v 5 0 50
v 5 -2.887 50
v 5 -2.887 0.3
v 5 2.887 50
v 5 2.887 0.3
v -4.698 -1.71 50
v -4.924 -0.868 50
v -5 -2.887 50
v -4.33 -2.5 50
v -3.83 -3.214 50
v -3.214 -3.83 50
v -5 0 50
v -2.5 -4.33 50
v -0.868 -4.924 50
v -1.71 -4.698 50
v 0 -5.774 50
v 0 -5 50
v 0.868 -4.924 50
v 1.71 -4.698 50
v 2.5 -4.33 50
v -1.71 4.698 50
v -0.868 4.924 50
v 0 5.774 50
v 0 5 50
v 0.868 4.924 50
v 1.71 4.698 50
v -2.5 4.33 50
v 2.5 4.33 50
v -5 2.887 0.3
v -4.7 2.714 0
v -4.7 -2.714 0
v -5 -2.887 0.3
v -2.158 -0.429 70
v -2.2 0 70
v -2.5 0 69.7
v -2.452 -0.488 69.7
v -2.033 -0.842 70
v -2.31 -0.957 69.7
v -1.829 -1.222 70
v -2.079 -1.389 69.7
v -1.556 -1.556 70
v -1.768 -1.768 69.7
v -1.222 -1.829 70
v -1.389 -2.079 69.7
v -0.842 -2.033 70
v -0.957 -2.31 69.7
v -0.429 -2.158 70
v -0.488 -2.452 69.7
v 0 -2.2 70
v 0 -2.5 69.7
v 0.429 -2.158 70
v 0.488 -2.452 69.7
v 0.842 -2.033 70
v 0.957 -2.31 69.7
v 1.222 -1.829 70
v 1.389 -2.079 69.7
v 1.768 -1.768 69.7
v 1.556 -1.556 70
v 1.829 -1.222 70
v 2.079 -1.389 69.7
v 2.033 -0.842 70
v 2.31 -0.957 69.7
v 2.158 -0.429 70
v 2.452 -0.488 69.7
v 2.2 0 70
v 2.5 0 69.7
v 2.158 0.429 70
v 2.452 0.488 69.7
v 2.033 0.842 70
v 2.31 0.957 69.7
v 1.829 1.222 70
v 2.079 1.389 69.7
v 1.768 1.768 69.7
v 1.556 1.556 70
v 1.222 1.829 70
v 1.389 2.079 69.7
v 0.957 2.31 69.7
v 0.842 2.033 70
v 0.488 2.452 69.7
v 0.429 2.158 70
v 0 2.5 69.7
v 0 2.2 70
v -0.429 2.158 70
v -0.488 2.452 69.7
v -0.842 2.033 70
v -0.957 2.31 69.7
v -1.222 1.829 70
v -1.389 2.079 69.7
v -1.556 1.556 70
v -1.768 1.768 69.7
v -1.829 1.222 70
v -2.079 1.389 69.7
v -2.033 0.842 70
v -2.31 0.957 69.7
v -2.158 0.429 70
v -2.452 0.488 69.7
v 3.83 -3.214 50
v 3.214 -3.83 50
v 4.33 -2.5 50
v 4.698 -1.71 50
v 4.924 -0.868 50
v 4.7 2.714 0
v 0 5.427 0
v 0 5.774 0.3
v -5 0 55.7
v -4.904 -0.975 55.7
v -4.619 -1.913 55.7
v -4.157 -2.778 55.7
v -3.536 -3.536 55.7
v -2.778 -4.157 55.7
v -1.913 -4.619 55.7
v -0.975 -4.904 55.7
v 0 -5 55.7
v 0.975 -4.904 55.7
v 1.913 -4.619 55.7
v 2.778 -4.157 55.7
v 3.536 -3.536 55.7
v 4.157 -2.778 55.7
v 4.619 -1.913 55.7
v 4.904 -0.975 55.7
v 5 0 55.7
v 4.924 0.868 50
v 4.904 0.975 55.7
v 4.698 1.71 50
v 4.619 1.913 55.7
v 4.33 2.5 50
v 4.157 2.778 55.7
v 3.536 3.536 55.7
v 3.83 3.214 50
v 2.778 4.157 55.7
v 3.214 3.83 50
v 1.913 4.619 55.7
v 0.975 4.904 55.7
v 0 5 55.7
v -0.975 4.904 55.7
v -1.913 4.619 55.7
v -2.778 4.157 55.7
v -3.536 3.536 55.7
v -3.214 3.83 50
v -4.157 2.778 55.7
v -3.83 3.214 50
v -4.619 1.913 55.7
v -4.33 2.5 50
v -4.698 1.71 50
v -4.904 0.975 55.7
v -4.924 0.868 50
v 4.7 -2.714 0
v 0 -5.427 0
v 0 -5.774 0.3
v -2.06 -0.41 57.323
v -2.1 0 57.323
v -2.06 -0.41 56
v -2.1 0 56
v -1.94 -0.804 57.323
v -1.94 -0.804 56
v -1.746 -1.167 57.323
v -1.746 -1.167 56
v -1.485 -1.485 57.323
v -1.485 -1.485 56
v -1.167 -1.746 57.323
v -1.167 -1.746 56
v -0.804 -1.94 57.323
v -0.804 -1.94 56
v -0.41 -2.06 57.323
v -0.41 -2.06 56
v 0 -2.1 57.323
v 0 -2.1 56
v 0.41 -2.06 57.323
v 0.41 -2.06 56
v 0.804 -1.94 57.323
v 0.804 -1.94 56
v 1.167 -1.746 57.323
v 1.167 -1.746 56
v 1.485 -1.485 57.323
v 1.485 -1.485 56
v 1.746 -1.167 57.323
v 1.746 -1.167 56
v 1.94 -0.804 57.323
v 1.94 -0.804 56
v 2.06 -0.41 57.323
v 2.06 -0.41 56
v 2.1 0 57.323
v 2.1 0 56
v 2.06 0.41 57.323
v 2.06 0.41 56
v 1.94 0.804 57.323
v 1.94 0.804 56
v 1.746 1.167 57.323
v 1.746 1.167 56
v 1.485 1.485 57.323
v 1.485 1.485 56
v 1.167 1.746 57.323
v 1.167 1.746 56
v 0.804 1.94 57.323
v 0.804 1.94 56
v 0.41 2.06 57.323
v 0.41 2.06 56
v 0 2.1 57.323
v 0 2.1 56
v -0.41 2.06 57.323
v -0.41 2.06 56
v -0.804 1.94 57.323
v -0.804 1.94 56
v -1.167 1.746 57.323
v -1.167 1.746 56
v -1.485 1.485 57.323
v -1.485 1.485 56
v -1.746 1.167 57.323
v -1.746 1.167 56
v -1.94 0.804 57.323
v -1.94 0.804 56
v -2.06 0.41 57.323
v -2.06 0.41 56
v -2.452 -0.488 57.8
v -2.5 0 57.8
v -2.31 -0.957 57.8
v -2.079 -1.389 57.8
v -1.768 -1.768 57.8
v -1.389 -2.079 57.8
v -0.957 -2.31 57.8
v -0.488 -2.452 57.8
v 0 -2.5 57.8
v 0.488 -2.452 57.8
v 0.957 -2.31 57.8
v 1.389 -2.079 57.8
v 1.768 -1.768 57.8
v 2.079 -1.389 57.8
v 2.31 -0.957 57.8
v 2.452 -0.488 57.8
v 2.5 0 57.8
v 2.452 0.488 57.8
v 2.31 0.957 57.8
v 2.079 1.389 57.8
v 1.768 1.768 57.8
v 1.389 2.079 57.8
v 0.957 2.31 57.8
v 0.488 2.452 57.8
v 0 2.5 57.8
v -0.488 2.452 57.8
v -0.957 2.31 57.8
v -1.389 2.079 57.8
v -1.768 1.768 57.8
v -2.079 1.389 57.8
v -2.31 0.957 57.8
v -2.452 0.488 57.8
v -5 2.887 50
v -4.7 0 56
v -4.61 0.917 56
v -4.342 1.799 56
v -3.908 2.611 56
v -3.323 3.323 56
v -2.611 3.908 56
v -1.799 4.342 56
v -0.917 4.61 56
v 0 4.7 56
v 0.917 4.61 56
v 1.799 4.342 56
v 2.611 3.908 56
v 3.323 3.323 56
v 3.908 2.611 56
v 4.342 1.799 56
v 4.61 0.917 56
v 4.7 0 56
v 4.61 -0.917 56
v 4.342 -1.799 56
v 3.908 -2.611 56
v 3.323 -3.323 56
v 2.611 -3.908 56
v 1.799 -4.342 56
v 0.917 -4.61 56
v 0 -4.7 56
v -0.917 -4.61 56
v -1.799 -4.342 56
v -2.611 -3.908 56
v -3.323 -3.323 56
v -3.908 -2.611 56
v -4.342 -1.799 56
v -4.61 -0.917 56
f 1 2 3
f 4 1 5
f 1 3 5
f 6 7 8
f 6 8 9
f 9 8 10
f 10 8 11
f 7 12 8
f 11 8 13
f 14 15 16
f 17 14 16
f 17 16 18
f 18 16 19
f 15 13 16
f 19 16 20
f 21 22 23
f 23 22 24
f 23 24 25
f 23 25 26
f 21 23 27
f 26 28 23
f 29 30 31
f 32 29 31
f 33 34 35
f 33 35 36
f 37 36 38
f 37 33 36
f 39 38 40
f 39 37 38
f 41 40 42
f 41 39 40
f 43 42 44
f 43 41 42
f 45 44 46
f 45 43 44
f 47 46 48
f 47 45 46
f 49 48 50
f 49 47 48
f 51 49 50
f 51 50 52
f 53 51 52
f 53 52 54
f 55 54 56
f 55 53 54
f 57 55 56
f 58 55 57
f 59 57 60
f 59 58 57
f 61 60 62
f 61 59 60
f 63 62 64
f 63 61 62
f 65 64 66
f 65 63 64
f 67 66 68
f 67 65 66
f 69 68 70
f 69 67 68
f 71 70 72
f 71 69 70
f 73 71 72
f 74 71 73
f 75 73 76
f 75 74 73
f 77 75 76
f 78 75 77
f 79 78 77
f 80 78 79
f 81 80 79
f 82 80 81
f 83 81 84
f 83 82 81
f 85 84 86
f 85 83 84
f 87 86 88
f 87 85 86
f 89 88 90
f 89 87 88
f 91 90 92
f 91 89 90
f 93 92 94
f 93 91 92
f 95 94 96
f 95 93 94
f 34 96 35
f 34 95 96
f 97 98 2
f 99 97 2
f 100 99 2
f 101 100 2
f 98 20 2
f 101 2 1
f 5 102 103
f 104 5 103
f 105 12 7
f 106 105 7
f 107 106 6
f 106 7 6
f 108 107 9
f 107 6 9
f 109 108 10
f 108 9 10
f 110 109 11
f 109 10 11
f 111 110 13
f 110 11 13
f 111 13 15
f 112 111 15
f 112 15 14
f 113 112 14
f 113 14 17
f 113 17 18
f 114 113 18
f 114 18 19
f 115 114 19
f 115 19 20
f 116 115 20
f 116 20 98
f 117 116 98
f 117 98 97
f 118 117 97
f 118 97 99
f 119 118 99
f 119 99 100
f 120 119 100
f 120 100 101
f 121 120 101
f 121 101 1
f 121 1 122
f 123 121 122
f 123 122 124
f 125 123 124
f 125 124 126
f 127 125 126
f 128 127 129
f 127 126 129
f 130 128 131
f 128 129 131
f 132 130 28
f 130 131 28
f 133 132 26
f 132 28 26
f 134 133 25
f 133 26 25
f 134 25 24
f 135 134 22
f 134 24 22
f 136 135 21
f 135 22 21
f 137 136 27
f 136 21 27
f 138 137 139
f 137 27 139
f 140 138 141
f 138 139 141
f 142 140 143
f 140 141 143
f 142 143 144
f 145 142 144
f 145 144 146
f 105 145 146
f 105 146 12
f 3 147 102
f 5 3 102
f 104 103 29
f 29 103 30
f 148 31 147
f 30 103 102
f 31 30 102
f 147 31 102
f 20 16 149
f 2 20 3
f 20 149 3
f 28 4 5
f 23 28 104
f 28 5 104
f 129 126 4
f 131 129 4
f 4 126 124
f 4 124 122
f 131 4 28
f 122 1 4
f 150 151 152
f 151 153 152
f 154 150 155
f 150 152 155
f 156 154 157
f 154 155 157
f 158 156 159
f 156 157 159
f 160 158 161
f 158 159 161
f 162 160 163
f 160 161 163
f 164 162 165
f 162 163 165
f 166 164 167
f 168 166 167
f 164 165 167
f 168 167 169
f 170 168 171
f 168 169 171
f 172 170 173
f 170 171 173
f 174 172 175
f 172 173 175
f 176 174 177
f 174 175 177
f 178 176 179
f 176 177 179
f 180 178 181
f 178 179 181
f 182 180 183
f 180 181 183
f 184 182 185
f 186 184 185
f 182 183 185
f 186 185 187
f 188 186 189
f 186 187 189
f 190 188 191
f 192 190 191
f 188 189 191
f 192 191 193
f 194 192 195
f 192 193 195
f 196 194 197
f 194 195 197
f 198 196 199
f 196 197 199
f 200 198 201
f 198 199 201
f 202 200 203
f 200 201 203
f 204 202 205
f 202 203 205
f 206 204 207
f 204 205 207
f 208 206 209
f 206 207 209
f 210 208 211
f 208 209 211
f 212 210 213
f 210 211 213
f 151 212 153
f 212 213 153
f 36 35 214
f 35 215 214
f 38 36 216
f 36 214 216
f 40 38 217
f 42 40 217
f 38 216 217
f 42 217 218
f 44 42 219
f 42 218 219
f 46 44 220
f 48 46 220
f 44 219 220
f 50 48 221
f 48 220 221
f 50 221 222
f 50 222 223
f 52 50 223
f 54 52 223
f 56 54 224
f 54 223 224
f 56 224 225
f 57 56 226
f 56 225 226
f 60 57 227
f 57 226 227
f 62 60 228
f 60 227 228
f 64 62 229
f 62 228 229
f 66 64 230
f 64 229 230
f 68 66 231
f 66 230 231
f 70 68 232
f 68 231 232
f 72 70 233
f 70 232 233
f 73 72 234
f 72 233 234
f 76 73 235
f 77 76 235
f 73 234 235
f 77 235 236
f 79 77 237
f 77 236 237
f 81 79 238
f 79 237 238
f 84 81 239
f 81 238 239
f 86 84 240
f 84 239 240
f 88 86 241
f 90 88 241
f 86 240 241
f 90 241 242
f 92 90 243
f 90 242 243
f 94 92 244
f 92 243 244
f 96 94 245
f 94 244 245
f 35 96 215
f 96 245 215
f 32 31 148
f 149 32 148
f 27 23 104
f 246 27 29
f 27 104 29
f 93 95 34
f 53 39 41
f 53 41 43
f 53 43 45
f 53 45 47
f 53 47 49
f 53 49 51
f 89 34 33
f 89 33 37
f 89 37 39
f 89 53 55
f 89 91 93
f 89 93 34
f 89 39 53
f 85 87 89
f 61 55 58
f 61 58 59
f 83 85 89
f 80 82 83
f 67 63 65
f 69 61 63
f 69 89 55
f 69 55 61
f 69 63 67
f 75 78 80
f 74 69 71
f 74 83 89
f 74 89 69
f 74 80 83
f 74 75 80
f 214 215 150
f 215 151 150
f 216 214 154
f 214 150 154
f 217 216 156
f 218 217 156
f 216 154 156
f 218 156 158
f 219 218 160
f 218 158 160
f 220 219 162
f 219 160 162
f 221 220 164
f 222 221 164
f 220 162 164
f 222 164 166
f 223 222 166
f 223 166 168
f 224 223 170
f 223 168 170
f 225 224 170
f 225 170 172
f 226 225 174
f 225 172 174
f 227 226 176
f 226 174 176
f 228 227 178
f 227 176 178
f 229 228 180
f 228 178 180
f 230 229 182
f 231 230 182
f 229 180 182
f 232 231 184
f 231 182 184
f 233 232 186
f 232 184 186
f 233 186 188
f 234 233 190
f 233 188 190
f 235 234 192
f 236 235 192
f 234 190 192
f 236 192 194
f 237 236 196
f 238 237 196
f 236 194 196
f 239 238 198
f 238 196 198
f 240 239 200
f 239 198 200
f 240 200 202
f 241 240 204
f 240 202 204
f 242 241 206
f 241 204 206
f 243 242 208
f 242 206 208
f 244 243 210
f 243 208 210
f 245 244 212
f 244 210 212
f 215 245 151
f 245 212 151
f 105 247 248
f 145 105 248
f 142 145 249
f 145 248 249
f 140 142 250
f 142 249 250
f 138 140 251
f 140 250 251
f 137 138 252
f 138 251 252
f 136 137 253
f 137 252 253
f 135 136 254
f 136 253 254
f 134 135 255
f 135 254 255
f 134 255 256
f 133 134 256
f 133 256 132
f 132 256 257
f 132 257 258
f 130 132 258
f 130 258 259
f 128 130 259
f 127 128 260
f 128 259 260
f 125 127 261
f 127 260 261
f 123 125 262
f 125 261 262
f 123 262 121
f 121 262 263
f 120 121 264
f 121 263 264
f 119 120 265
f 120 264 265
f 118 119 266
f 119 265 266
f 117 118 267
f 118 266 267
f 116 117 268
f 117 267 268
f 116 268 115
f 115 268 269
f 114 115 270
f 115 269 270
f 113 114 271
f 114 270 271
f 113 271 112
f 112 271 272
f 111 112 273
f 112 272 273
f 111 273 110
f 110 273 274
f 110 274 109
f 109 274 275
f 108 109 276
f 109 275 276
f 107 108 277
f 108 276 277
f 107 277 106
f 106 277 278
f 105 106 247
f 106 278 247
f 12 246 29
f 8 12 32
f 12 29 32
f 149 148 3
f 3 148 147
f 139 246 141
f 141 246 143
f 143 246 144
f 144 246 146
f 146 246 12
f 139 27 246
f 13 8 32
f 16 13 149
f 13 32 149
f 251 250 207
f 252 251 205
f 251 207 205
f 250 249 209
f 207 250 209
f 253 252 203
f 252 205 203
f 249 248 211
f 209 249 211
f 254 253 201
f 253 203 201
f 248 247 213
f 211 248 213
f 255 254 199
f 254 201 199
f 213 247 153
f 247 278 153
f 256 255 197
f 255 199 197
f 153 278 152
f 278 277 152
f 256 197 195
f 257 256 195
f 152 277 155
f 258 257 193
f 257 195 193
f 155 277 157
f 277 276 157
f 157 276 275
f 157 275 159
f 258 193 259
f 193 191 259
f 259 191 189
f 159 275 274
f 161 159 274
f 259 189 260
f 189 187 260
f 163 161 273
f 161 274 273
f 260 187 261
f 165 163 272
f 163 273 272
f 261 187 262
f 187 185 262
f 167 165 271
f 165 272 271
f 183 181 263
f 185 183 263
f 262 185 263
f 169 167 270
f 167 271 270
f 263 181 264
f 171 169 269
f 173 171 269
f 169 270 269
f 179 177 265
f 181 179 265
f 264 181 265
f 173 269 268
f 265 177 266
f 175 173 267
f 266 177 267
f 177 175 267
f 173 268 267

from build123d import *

# Parameters (mm, degrees)
AUFSATZ_LINEAR_AUSTRAGEN1_DEPTH = 70
FASE1_SIZE                      = 0.3
FASE2_SIZE                      = 0.3


with BuildPart() as part:
    # Skizze1 → Aufsatz-Linear austragen1 (new body)
    with BuildSketch(Plane.XY):
        Polygon((0, 5.773502692), (-5, 2.886751346), (-5, -2.886751346), (0, -5.773502692), (5, -2.886751346), (5, 2.886751346), align=None)
    extrude(amount=AUFSATZ_LINEAR_AUSTRAGEN1_DEPTH)

    # Skizze2 → Schnitt-Rotation1 (revolve, cut)
    with BuildSketch(Plane(origin=(0, 0, 0), x_dir=(0, 0, -1), z_dir=(1, 0, 0)), mode=Mode.PRIVATE) as schnitt_rotation1_sk:
        Polygon((-70, 2.5), (-56, 2.5), (-56, 5), (-50, 5), (-50, 7.5), (-70, 7.5), align=None)
    revolve(schnitt_rotation1_sk.sketch.rotate(Axis((0, 0, 56.716665977), (0, 0, 1)), 90), axis=Axis((0, 0, 56.716665977), (0, 0, 1)), mode=Mode.SUBTRACT)

    # Fase1
    fase1_edges = [part.edges().sort_by_distance(p)[0] for p in [
        (2.5, 0, 70),
        (5, 0, 56),
    ]]
    chamfer(fase1_edges, length=FASE1_SIZE)

    # Skizze3 → Schnitt-Rotation2 (revolve, cut)
    with BuildSketch(Plane(origin=(0, 0, 0), x_dir=(0, 0, -1), z_dir=(1, 0, 0)), mode=Mode.PRIVATE) as schnitt_rotation2_sk:
        Polygon((-56, 2.5), (-57.8, 2.5), (-57.323298563, 2.1), (-56, 2.1), align=None)
    revolve(schnitt_rotation2_sk.sketch.rotate(Axis((0, 0, 56), (0, 0, 1)), 90), axis=Axis((0, 0, 56), (0, 0, 1)), mode=Mode.SUBTRACT)

    # Fase2
    fase2_edges = [part.edges().sort_by_distance(p)[0] for p in [
        (5, 0, 0),
        (2.5, -4.330127019, 0),
        (-2.5, -4.330127019, 0),
        (-5, 0, 0),
        (-2.5, 4.330127019, 0),
        (2.5, 4.330127019, 0),
    ]]
    chamfer(fase2_edges, length=FASE2_SIZE)


solid = part.part
